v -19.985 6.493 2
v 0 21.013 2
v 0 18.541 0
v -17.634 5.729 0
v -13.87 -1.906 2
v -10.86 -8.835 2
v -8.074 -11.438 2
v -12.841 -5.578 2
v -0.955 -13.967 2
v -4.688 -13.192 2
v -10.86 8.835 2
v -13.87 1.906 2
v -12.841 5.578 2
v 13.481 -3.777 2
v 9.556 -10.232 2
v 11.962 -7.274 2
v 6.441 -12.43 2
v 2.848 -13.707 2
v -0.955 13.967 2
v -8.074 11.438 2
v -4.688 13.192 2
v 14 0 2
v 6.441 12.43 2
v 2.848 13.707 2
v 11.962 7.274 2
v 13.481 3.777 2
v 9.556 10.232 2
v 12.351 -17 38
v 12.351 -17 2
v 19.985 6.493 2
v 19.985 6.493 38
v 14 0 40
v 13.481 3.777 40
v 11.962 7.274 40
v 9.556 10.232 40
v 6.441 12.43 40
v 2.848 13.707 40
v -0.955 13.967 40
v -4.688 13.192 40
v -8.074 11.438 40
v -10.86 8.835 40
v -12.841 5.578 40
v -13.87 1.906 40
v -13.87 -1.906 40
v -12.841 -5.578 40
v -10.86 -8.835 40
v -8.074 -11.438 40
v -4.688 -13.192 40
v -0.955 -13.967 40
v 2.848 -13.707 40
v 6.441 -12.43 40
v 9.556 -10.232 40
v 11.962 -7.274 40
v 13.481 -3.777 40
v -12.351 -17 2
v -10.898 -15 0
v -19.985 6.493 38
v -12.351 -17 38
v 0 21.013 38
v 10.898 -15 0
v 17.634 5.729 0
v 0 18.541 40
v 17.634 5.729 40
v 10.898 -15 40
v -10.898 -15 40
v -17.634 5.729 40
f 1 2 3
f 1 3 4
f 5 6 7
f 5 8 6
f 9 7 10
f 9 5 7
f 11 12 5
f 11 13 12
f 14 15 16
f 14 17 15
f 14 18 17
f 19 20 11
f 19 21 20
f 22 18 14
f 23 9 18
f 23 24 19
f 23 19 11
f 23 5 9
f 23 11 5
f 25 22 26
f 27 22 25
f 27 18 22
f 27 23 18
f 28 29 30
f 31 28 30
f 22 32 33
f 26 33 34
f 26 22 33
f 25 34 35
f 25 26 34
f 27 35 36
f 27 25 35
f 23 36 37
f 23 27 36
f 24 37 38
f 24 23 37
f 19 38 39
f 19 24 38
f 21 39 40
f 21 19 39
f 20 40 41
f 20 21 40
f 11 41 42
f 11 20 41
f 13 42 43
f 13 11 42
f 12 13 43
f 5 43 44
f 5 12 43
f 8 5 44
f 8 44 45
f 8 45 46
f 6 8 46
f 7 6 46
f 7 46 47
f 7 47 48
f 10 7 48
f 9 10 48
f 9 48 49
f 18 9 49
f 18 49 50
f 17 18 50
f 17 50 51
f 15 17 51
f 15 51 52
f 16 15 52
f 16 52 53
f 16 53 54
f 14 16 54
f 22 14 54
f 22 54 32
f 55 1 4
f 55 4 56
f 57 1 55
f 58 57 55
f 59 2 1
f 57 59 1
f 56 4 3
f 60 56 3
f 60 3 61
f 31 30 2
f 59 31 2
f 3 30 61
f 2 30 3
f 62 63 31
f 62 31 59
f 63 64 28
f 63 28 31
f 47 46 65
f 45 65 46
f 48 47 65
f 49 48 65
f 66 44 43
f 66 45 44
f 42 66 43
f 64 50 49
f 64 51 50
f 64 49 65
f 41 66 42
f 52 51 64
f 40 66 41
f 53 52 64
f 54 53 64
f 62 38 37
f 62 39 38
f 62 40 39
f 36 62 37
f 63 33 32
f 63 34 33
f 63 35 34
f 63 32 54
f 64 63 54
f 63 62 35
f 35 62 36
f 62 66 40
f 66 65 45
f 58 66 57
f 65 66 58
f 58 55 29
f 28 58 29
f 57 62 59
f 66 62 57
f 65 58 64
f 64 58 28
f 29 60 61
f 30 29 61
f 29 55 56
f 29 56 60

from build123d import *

# Parameters (mm, degrees)
F0_R     = 14
F1_DEPTH = 2
F2_DEPTH = 40
F3_SIZE  = 2


with BuildPart() as f1:
    # F0 (on Top) → F1 (new body)
    with BuildSketch(Plane.XY):
        Polygon((12.351223, -17), (19.984699, 6.493422), (0, 21.013156), (-19.984699, 6.493422), (-12.351223, -17), align=None)
        Circle(F0_R, mode=Mode.SUBTRACT)
        Circle(F0_R)
    extrude(amount=F1_DEPTH)

    # F0 (on Top) → F2 (join)
    with BuildSketch(Plane.XY):
        Polygon((12.351223, -17), (19.984699, 6.493422), (0, 21.013156), (-19.984699, 6.493422), (-12.351223, -17), align=None)
        Circle(F0_R, mode=Mode.SUBTRACT)
    extrude(amount=F2_DEPTH)

    # F3
    f3_edges = [f1.edges().sort_by_distance(p)[0] for p in [
        (16.167961, -5.253289, 40),
        (9.992349, 13.753289, 40),
        (-9.992349, 13.753289, 40),
        (-16.167961, -5.253289, 40),
        (0, -17, 40),
        (16.167961, -5.253289, 0),
        (9.992349, 13.753289, 0),
        (-16.167961, -5.253289, 0),
        (0, -17, 0),
        (-9.992349, 13.753289, 0),
    ]]
    chamfer(f3_edges, length=F3_SIZE)


solid = f1.part
